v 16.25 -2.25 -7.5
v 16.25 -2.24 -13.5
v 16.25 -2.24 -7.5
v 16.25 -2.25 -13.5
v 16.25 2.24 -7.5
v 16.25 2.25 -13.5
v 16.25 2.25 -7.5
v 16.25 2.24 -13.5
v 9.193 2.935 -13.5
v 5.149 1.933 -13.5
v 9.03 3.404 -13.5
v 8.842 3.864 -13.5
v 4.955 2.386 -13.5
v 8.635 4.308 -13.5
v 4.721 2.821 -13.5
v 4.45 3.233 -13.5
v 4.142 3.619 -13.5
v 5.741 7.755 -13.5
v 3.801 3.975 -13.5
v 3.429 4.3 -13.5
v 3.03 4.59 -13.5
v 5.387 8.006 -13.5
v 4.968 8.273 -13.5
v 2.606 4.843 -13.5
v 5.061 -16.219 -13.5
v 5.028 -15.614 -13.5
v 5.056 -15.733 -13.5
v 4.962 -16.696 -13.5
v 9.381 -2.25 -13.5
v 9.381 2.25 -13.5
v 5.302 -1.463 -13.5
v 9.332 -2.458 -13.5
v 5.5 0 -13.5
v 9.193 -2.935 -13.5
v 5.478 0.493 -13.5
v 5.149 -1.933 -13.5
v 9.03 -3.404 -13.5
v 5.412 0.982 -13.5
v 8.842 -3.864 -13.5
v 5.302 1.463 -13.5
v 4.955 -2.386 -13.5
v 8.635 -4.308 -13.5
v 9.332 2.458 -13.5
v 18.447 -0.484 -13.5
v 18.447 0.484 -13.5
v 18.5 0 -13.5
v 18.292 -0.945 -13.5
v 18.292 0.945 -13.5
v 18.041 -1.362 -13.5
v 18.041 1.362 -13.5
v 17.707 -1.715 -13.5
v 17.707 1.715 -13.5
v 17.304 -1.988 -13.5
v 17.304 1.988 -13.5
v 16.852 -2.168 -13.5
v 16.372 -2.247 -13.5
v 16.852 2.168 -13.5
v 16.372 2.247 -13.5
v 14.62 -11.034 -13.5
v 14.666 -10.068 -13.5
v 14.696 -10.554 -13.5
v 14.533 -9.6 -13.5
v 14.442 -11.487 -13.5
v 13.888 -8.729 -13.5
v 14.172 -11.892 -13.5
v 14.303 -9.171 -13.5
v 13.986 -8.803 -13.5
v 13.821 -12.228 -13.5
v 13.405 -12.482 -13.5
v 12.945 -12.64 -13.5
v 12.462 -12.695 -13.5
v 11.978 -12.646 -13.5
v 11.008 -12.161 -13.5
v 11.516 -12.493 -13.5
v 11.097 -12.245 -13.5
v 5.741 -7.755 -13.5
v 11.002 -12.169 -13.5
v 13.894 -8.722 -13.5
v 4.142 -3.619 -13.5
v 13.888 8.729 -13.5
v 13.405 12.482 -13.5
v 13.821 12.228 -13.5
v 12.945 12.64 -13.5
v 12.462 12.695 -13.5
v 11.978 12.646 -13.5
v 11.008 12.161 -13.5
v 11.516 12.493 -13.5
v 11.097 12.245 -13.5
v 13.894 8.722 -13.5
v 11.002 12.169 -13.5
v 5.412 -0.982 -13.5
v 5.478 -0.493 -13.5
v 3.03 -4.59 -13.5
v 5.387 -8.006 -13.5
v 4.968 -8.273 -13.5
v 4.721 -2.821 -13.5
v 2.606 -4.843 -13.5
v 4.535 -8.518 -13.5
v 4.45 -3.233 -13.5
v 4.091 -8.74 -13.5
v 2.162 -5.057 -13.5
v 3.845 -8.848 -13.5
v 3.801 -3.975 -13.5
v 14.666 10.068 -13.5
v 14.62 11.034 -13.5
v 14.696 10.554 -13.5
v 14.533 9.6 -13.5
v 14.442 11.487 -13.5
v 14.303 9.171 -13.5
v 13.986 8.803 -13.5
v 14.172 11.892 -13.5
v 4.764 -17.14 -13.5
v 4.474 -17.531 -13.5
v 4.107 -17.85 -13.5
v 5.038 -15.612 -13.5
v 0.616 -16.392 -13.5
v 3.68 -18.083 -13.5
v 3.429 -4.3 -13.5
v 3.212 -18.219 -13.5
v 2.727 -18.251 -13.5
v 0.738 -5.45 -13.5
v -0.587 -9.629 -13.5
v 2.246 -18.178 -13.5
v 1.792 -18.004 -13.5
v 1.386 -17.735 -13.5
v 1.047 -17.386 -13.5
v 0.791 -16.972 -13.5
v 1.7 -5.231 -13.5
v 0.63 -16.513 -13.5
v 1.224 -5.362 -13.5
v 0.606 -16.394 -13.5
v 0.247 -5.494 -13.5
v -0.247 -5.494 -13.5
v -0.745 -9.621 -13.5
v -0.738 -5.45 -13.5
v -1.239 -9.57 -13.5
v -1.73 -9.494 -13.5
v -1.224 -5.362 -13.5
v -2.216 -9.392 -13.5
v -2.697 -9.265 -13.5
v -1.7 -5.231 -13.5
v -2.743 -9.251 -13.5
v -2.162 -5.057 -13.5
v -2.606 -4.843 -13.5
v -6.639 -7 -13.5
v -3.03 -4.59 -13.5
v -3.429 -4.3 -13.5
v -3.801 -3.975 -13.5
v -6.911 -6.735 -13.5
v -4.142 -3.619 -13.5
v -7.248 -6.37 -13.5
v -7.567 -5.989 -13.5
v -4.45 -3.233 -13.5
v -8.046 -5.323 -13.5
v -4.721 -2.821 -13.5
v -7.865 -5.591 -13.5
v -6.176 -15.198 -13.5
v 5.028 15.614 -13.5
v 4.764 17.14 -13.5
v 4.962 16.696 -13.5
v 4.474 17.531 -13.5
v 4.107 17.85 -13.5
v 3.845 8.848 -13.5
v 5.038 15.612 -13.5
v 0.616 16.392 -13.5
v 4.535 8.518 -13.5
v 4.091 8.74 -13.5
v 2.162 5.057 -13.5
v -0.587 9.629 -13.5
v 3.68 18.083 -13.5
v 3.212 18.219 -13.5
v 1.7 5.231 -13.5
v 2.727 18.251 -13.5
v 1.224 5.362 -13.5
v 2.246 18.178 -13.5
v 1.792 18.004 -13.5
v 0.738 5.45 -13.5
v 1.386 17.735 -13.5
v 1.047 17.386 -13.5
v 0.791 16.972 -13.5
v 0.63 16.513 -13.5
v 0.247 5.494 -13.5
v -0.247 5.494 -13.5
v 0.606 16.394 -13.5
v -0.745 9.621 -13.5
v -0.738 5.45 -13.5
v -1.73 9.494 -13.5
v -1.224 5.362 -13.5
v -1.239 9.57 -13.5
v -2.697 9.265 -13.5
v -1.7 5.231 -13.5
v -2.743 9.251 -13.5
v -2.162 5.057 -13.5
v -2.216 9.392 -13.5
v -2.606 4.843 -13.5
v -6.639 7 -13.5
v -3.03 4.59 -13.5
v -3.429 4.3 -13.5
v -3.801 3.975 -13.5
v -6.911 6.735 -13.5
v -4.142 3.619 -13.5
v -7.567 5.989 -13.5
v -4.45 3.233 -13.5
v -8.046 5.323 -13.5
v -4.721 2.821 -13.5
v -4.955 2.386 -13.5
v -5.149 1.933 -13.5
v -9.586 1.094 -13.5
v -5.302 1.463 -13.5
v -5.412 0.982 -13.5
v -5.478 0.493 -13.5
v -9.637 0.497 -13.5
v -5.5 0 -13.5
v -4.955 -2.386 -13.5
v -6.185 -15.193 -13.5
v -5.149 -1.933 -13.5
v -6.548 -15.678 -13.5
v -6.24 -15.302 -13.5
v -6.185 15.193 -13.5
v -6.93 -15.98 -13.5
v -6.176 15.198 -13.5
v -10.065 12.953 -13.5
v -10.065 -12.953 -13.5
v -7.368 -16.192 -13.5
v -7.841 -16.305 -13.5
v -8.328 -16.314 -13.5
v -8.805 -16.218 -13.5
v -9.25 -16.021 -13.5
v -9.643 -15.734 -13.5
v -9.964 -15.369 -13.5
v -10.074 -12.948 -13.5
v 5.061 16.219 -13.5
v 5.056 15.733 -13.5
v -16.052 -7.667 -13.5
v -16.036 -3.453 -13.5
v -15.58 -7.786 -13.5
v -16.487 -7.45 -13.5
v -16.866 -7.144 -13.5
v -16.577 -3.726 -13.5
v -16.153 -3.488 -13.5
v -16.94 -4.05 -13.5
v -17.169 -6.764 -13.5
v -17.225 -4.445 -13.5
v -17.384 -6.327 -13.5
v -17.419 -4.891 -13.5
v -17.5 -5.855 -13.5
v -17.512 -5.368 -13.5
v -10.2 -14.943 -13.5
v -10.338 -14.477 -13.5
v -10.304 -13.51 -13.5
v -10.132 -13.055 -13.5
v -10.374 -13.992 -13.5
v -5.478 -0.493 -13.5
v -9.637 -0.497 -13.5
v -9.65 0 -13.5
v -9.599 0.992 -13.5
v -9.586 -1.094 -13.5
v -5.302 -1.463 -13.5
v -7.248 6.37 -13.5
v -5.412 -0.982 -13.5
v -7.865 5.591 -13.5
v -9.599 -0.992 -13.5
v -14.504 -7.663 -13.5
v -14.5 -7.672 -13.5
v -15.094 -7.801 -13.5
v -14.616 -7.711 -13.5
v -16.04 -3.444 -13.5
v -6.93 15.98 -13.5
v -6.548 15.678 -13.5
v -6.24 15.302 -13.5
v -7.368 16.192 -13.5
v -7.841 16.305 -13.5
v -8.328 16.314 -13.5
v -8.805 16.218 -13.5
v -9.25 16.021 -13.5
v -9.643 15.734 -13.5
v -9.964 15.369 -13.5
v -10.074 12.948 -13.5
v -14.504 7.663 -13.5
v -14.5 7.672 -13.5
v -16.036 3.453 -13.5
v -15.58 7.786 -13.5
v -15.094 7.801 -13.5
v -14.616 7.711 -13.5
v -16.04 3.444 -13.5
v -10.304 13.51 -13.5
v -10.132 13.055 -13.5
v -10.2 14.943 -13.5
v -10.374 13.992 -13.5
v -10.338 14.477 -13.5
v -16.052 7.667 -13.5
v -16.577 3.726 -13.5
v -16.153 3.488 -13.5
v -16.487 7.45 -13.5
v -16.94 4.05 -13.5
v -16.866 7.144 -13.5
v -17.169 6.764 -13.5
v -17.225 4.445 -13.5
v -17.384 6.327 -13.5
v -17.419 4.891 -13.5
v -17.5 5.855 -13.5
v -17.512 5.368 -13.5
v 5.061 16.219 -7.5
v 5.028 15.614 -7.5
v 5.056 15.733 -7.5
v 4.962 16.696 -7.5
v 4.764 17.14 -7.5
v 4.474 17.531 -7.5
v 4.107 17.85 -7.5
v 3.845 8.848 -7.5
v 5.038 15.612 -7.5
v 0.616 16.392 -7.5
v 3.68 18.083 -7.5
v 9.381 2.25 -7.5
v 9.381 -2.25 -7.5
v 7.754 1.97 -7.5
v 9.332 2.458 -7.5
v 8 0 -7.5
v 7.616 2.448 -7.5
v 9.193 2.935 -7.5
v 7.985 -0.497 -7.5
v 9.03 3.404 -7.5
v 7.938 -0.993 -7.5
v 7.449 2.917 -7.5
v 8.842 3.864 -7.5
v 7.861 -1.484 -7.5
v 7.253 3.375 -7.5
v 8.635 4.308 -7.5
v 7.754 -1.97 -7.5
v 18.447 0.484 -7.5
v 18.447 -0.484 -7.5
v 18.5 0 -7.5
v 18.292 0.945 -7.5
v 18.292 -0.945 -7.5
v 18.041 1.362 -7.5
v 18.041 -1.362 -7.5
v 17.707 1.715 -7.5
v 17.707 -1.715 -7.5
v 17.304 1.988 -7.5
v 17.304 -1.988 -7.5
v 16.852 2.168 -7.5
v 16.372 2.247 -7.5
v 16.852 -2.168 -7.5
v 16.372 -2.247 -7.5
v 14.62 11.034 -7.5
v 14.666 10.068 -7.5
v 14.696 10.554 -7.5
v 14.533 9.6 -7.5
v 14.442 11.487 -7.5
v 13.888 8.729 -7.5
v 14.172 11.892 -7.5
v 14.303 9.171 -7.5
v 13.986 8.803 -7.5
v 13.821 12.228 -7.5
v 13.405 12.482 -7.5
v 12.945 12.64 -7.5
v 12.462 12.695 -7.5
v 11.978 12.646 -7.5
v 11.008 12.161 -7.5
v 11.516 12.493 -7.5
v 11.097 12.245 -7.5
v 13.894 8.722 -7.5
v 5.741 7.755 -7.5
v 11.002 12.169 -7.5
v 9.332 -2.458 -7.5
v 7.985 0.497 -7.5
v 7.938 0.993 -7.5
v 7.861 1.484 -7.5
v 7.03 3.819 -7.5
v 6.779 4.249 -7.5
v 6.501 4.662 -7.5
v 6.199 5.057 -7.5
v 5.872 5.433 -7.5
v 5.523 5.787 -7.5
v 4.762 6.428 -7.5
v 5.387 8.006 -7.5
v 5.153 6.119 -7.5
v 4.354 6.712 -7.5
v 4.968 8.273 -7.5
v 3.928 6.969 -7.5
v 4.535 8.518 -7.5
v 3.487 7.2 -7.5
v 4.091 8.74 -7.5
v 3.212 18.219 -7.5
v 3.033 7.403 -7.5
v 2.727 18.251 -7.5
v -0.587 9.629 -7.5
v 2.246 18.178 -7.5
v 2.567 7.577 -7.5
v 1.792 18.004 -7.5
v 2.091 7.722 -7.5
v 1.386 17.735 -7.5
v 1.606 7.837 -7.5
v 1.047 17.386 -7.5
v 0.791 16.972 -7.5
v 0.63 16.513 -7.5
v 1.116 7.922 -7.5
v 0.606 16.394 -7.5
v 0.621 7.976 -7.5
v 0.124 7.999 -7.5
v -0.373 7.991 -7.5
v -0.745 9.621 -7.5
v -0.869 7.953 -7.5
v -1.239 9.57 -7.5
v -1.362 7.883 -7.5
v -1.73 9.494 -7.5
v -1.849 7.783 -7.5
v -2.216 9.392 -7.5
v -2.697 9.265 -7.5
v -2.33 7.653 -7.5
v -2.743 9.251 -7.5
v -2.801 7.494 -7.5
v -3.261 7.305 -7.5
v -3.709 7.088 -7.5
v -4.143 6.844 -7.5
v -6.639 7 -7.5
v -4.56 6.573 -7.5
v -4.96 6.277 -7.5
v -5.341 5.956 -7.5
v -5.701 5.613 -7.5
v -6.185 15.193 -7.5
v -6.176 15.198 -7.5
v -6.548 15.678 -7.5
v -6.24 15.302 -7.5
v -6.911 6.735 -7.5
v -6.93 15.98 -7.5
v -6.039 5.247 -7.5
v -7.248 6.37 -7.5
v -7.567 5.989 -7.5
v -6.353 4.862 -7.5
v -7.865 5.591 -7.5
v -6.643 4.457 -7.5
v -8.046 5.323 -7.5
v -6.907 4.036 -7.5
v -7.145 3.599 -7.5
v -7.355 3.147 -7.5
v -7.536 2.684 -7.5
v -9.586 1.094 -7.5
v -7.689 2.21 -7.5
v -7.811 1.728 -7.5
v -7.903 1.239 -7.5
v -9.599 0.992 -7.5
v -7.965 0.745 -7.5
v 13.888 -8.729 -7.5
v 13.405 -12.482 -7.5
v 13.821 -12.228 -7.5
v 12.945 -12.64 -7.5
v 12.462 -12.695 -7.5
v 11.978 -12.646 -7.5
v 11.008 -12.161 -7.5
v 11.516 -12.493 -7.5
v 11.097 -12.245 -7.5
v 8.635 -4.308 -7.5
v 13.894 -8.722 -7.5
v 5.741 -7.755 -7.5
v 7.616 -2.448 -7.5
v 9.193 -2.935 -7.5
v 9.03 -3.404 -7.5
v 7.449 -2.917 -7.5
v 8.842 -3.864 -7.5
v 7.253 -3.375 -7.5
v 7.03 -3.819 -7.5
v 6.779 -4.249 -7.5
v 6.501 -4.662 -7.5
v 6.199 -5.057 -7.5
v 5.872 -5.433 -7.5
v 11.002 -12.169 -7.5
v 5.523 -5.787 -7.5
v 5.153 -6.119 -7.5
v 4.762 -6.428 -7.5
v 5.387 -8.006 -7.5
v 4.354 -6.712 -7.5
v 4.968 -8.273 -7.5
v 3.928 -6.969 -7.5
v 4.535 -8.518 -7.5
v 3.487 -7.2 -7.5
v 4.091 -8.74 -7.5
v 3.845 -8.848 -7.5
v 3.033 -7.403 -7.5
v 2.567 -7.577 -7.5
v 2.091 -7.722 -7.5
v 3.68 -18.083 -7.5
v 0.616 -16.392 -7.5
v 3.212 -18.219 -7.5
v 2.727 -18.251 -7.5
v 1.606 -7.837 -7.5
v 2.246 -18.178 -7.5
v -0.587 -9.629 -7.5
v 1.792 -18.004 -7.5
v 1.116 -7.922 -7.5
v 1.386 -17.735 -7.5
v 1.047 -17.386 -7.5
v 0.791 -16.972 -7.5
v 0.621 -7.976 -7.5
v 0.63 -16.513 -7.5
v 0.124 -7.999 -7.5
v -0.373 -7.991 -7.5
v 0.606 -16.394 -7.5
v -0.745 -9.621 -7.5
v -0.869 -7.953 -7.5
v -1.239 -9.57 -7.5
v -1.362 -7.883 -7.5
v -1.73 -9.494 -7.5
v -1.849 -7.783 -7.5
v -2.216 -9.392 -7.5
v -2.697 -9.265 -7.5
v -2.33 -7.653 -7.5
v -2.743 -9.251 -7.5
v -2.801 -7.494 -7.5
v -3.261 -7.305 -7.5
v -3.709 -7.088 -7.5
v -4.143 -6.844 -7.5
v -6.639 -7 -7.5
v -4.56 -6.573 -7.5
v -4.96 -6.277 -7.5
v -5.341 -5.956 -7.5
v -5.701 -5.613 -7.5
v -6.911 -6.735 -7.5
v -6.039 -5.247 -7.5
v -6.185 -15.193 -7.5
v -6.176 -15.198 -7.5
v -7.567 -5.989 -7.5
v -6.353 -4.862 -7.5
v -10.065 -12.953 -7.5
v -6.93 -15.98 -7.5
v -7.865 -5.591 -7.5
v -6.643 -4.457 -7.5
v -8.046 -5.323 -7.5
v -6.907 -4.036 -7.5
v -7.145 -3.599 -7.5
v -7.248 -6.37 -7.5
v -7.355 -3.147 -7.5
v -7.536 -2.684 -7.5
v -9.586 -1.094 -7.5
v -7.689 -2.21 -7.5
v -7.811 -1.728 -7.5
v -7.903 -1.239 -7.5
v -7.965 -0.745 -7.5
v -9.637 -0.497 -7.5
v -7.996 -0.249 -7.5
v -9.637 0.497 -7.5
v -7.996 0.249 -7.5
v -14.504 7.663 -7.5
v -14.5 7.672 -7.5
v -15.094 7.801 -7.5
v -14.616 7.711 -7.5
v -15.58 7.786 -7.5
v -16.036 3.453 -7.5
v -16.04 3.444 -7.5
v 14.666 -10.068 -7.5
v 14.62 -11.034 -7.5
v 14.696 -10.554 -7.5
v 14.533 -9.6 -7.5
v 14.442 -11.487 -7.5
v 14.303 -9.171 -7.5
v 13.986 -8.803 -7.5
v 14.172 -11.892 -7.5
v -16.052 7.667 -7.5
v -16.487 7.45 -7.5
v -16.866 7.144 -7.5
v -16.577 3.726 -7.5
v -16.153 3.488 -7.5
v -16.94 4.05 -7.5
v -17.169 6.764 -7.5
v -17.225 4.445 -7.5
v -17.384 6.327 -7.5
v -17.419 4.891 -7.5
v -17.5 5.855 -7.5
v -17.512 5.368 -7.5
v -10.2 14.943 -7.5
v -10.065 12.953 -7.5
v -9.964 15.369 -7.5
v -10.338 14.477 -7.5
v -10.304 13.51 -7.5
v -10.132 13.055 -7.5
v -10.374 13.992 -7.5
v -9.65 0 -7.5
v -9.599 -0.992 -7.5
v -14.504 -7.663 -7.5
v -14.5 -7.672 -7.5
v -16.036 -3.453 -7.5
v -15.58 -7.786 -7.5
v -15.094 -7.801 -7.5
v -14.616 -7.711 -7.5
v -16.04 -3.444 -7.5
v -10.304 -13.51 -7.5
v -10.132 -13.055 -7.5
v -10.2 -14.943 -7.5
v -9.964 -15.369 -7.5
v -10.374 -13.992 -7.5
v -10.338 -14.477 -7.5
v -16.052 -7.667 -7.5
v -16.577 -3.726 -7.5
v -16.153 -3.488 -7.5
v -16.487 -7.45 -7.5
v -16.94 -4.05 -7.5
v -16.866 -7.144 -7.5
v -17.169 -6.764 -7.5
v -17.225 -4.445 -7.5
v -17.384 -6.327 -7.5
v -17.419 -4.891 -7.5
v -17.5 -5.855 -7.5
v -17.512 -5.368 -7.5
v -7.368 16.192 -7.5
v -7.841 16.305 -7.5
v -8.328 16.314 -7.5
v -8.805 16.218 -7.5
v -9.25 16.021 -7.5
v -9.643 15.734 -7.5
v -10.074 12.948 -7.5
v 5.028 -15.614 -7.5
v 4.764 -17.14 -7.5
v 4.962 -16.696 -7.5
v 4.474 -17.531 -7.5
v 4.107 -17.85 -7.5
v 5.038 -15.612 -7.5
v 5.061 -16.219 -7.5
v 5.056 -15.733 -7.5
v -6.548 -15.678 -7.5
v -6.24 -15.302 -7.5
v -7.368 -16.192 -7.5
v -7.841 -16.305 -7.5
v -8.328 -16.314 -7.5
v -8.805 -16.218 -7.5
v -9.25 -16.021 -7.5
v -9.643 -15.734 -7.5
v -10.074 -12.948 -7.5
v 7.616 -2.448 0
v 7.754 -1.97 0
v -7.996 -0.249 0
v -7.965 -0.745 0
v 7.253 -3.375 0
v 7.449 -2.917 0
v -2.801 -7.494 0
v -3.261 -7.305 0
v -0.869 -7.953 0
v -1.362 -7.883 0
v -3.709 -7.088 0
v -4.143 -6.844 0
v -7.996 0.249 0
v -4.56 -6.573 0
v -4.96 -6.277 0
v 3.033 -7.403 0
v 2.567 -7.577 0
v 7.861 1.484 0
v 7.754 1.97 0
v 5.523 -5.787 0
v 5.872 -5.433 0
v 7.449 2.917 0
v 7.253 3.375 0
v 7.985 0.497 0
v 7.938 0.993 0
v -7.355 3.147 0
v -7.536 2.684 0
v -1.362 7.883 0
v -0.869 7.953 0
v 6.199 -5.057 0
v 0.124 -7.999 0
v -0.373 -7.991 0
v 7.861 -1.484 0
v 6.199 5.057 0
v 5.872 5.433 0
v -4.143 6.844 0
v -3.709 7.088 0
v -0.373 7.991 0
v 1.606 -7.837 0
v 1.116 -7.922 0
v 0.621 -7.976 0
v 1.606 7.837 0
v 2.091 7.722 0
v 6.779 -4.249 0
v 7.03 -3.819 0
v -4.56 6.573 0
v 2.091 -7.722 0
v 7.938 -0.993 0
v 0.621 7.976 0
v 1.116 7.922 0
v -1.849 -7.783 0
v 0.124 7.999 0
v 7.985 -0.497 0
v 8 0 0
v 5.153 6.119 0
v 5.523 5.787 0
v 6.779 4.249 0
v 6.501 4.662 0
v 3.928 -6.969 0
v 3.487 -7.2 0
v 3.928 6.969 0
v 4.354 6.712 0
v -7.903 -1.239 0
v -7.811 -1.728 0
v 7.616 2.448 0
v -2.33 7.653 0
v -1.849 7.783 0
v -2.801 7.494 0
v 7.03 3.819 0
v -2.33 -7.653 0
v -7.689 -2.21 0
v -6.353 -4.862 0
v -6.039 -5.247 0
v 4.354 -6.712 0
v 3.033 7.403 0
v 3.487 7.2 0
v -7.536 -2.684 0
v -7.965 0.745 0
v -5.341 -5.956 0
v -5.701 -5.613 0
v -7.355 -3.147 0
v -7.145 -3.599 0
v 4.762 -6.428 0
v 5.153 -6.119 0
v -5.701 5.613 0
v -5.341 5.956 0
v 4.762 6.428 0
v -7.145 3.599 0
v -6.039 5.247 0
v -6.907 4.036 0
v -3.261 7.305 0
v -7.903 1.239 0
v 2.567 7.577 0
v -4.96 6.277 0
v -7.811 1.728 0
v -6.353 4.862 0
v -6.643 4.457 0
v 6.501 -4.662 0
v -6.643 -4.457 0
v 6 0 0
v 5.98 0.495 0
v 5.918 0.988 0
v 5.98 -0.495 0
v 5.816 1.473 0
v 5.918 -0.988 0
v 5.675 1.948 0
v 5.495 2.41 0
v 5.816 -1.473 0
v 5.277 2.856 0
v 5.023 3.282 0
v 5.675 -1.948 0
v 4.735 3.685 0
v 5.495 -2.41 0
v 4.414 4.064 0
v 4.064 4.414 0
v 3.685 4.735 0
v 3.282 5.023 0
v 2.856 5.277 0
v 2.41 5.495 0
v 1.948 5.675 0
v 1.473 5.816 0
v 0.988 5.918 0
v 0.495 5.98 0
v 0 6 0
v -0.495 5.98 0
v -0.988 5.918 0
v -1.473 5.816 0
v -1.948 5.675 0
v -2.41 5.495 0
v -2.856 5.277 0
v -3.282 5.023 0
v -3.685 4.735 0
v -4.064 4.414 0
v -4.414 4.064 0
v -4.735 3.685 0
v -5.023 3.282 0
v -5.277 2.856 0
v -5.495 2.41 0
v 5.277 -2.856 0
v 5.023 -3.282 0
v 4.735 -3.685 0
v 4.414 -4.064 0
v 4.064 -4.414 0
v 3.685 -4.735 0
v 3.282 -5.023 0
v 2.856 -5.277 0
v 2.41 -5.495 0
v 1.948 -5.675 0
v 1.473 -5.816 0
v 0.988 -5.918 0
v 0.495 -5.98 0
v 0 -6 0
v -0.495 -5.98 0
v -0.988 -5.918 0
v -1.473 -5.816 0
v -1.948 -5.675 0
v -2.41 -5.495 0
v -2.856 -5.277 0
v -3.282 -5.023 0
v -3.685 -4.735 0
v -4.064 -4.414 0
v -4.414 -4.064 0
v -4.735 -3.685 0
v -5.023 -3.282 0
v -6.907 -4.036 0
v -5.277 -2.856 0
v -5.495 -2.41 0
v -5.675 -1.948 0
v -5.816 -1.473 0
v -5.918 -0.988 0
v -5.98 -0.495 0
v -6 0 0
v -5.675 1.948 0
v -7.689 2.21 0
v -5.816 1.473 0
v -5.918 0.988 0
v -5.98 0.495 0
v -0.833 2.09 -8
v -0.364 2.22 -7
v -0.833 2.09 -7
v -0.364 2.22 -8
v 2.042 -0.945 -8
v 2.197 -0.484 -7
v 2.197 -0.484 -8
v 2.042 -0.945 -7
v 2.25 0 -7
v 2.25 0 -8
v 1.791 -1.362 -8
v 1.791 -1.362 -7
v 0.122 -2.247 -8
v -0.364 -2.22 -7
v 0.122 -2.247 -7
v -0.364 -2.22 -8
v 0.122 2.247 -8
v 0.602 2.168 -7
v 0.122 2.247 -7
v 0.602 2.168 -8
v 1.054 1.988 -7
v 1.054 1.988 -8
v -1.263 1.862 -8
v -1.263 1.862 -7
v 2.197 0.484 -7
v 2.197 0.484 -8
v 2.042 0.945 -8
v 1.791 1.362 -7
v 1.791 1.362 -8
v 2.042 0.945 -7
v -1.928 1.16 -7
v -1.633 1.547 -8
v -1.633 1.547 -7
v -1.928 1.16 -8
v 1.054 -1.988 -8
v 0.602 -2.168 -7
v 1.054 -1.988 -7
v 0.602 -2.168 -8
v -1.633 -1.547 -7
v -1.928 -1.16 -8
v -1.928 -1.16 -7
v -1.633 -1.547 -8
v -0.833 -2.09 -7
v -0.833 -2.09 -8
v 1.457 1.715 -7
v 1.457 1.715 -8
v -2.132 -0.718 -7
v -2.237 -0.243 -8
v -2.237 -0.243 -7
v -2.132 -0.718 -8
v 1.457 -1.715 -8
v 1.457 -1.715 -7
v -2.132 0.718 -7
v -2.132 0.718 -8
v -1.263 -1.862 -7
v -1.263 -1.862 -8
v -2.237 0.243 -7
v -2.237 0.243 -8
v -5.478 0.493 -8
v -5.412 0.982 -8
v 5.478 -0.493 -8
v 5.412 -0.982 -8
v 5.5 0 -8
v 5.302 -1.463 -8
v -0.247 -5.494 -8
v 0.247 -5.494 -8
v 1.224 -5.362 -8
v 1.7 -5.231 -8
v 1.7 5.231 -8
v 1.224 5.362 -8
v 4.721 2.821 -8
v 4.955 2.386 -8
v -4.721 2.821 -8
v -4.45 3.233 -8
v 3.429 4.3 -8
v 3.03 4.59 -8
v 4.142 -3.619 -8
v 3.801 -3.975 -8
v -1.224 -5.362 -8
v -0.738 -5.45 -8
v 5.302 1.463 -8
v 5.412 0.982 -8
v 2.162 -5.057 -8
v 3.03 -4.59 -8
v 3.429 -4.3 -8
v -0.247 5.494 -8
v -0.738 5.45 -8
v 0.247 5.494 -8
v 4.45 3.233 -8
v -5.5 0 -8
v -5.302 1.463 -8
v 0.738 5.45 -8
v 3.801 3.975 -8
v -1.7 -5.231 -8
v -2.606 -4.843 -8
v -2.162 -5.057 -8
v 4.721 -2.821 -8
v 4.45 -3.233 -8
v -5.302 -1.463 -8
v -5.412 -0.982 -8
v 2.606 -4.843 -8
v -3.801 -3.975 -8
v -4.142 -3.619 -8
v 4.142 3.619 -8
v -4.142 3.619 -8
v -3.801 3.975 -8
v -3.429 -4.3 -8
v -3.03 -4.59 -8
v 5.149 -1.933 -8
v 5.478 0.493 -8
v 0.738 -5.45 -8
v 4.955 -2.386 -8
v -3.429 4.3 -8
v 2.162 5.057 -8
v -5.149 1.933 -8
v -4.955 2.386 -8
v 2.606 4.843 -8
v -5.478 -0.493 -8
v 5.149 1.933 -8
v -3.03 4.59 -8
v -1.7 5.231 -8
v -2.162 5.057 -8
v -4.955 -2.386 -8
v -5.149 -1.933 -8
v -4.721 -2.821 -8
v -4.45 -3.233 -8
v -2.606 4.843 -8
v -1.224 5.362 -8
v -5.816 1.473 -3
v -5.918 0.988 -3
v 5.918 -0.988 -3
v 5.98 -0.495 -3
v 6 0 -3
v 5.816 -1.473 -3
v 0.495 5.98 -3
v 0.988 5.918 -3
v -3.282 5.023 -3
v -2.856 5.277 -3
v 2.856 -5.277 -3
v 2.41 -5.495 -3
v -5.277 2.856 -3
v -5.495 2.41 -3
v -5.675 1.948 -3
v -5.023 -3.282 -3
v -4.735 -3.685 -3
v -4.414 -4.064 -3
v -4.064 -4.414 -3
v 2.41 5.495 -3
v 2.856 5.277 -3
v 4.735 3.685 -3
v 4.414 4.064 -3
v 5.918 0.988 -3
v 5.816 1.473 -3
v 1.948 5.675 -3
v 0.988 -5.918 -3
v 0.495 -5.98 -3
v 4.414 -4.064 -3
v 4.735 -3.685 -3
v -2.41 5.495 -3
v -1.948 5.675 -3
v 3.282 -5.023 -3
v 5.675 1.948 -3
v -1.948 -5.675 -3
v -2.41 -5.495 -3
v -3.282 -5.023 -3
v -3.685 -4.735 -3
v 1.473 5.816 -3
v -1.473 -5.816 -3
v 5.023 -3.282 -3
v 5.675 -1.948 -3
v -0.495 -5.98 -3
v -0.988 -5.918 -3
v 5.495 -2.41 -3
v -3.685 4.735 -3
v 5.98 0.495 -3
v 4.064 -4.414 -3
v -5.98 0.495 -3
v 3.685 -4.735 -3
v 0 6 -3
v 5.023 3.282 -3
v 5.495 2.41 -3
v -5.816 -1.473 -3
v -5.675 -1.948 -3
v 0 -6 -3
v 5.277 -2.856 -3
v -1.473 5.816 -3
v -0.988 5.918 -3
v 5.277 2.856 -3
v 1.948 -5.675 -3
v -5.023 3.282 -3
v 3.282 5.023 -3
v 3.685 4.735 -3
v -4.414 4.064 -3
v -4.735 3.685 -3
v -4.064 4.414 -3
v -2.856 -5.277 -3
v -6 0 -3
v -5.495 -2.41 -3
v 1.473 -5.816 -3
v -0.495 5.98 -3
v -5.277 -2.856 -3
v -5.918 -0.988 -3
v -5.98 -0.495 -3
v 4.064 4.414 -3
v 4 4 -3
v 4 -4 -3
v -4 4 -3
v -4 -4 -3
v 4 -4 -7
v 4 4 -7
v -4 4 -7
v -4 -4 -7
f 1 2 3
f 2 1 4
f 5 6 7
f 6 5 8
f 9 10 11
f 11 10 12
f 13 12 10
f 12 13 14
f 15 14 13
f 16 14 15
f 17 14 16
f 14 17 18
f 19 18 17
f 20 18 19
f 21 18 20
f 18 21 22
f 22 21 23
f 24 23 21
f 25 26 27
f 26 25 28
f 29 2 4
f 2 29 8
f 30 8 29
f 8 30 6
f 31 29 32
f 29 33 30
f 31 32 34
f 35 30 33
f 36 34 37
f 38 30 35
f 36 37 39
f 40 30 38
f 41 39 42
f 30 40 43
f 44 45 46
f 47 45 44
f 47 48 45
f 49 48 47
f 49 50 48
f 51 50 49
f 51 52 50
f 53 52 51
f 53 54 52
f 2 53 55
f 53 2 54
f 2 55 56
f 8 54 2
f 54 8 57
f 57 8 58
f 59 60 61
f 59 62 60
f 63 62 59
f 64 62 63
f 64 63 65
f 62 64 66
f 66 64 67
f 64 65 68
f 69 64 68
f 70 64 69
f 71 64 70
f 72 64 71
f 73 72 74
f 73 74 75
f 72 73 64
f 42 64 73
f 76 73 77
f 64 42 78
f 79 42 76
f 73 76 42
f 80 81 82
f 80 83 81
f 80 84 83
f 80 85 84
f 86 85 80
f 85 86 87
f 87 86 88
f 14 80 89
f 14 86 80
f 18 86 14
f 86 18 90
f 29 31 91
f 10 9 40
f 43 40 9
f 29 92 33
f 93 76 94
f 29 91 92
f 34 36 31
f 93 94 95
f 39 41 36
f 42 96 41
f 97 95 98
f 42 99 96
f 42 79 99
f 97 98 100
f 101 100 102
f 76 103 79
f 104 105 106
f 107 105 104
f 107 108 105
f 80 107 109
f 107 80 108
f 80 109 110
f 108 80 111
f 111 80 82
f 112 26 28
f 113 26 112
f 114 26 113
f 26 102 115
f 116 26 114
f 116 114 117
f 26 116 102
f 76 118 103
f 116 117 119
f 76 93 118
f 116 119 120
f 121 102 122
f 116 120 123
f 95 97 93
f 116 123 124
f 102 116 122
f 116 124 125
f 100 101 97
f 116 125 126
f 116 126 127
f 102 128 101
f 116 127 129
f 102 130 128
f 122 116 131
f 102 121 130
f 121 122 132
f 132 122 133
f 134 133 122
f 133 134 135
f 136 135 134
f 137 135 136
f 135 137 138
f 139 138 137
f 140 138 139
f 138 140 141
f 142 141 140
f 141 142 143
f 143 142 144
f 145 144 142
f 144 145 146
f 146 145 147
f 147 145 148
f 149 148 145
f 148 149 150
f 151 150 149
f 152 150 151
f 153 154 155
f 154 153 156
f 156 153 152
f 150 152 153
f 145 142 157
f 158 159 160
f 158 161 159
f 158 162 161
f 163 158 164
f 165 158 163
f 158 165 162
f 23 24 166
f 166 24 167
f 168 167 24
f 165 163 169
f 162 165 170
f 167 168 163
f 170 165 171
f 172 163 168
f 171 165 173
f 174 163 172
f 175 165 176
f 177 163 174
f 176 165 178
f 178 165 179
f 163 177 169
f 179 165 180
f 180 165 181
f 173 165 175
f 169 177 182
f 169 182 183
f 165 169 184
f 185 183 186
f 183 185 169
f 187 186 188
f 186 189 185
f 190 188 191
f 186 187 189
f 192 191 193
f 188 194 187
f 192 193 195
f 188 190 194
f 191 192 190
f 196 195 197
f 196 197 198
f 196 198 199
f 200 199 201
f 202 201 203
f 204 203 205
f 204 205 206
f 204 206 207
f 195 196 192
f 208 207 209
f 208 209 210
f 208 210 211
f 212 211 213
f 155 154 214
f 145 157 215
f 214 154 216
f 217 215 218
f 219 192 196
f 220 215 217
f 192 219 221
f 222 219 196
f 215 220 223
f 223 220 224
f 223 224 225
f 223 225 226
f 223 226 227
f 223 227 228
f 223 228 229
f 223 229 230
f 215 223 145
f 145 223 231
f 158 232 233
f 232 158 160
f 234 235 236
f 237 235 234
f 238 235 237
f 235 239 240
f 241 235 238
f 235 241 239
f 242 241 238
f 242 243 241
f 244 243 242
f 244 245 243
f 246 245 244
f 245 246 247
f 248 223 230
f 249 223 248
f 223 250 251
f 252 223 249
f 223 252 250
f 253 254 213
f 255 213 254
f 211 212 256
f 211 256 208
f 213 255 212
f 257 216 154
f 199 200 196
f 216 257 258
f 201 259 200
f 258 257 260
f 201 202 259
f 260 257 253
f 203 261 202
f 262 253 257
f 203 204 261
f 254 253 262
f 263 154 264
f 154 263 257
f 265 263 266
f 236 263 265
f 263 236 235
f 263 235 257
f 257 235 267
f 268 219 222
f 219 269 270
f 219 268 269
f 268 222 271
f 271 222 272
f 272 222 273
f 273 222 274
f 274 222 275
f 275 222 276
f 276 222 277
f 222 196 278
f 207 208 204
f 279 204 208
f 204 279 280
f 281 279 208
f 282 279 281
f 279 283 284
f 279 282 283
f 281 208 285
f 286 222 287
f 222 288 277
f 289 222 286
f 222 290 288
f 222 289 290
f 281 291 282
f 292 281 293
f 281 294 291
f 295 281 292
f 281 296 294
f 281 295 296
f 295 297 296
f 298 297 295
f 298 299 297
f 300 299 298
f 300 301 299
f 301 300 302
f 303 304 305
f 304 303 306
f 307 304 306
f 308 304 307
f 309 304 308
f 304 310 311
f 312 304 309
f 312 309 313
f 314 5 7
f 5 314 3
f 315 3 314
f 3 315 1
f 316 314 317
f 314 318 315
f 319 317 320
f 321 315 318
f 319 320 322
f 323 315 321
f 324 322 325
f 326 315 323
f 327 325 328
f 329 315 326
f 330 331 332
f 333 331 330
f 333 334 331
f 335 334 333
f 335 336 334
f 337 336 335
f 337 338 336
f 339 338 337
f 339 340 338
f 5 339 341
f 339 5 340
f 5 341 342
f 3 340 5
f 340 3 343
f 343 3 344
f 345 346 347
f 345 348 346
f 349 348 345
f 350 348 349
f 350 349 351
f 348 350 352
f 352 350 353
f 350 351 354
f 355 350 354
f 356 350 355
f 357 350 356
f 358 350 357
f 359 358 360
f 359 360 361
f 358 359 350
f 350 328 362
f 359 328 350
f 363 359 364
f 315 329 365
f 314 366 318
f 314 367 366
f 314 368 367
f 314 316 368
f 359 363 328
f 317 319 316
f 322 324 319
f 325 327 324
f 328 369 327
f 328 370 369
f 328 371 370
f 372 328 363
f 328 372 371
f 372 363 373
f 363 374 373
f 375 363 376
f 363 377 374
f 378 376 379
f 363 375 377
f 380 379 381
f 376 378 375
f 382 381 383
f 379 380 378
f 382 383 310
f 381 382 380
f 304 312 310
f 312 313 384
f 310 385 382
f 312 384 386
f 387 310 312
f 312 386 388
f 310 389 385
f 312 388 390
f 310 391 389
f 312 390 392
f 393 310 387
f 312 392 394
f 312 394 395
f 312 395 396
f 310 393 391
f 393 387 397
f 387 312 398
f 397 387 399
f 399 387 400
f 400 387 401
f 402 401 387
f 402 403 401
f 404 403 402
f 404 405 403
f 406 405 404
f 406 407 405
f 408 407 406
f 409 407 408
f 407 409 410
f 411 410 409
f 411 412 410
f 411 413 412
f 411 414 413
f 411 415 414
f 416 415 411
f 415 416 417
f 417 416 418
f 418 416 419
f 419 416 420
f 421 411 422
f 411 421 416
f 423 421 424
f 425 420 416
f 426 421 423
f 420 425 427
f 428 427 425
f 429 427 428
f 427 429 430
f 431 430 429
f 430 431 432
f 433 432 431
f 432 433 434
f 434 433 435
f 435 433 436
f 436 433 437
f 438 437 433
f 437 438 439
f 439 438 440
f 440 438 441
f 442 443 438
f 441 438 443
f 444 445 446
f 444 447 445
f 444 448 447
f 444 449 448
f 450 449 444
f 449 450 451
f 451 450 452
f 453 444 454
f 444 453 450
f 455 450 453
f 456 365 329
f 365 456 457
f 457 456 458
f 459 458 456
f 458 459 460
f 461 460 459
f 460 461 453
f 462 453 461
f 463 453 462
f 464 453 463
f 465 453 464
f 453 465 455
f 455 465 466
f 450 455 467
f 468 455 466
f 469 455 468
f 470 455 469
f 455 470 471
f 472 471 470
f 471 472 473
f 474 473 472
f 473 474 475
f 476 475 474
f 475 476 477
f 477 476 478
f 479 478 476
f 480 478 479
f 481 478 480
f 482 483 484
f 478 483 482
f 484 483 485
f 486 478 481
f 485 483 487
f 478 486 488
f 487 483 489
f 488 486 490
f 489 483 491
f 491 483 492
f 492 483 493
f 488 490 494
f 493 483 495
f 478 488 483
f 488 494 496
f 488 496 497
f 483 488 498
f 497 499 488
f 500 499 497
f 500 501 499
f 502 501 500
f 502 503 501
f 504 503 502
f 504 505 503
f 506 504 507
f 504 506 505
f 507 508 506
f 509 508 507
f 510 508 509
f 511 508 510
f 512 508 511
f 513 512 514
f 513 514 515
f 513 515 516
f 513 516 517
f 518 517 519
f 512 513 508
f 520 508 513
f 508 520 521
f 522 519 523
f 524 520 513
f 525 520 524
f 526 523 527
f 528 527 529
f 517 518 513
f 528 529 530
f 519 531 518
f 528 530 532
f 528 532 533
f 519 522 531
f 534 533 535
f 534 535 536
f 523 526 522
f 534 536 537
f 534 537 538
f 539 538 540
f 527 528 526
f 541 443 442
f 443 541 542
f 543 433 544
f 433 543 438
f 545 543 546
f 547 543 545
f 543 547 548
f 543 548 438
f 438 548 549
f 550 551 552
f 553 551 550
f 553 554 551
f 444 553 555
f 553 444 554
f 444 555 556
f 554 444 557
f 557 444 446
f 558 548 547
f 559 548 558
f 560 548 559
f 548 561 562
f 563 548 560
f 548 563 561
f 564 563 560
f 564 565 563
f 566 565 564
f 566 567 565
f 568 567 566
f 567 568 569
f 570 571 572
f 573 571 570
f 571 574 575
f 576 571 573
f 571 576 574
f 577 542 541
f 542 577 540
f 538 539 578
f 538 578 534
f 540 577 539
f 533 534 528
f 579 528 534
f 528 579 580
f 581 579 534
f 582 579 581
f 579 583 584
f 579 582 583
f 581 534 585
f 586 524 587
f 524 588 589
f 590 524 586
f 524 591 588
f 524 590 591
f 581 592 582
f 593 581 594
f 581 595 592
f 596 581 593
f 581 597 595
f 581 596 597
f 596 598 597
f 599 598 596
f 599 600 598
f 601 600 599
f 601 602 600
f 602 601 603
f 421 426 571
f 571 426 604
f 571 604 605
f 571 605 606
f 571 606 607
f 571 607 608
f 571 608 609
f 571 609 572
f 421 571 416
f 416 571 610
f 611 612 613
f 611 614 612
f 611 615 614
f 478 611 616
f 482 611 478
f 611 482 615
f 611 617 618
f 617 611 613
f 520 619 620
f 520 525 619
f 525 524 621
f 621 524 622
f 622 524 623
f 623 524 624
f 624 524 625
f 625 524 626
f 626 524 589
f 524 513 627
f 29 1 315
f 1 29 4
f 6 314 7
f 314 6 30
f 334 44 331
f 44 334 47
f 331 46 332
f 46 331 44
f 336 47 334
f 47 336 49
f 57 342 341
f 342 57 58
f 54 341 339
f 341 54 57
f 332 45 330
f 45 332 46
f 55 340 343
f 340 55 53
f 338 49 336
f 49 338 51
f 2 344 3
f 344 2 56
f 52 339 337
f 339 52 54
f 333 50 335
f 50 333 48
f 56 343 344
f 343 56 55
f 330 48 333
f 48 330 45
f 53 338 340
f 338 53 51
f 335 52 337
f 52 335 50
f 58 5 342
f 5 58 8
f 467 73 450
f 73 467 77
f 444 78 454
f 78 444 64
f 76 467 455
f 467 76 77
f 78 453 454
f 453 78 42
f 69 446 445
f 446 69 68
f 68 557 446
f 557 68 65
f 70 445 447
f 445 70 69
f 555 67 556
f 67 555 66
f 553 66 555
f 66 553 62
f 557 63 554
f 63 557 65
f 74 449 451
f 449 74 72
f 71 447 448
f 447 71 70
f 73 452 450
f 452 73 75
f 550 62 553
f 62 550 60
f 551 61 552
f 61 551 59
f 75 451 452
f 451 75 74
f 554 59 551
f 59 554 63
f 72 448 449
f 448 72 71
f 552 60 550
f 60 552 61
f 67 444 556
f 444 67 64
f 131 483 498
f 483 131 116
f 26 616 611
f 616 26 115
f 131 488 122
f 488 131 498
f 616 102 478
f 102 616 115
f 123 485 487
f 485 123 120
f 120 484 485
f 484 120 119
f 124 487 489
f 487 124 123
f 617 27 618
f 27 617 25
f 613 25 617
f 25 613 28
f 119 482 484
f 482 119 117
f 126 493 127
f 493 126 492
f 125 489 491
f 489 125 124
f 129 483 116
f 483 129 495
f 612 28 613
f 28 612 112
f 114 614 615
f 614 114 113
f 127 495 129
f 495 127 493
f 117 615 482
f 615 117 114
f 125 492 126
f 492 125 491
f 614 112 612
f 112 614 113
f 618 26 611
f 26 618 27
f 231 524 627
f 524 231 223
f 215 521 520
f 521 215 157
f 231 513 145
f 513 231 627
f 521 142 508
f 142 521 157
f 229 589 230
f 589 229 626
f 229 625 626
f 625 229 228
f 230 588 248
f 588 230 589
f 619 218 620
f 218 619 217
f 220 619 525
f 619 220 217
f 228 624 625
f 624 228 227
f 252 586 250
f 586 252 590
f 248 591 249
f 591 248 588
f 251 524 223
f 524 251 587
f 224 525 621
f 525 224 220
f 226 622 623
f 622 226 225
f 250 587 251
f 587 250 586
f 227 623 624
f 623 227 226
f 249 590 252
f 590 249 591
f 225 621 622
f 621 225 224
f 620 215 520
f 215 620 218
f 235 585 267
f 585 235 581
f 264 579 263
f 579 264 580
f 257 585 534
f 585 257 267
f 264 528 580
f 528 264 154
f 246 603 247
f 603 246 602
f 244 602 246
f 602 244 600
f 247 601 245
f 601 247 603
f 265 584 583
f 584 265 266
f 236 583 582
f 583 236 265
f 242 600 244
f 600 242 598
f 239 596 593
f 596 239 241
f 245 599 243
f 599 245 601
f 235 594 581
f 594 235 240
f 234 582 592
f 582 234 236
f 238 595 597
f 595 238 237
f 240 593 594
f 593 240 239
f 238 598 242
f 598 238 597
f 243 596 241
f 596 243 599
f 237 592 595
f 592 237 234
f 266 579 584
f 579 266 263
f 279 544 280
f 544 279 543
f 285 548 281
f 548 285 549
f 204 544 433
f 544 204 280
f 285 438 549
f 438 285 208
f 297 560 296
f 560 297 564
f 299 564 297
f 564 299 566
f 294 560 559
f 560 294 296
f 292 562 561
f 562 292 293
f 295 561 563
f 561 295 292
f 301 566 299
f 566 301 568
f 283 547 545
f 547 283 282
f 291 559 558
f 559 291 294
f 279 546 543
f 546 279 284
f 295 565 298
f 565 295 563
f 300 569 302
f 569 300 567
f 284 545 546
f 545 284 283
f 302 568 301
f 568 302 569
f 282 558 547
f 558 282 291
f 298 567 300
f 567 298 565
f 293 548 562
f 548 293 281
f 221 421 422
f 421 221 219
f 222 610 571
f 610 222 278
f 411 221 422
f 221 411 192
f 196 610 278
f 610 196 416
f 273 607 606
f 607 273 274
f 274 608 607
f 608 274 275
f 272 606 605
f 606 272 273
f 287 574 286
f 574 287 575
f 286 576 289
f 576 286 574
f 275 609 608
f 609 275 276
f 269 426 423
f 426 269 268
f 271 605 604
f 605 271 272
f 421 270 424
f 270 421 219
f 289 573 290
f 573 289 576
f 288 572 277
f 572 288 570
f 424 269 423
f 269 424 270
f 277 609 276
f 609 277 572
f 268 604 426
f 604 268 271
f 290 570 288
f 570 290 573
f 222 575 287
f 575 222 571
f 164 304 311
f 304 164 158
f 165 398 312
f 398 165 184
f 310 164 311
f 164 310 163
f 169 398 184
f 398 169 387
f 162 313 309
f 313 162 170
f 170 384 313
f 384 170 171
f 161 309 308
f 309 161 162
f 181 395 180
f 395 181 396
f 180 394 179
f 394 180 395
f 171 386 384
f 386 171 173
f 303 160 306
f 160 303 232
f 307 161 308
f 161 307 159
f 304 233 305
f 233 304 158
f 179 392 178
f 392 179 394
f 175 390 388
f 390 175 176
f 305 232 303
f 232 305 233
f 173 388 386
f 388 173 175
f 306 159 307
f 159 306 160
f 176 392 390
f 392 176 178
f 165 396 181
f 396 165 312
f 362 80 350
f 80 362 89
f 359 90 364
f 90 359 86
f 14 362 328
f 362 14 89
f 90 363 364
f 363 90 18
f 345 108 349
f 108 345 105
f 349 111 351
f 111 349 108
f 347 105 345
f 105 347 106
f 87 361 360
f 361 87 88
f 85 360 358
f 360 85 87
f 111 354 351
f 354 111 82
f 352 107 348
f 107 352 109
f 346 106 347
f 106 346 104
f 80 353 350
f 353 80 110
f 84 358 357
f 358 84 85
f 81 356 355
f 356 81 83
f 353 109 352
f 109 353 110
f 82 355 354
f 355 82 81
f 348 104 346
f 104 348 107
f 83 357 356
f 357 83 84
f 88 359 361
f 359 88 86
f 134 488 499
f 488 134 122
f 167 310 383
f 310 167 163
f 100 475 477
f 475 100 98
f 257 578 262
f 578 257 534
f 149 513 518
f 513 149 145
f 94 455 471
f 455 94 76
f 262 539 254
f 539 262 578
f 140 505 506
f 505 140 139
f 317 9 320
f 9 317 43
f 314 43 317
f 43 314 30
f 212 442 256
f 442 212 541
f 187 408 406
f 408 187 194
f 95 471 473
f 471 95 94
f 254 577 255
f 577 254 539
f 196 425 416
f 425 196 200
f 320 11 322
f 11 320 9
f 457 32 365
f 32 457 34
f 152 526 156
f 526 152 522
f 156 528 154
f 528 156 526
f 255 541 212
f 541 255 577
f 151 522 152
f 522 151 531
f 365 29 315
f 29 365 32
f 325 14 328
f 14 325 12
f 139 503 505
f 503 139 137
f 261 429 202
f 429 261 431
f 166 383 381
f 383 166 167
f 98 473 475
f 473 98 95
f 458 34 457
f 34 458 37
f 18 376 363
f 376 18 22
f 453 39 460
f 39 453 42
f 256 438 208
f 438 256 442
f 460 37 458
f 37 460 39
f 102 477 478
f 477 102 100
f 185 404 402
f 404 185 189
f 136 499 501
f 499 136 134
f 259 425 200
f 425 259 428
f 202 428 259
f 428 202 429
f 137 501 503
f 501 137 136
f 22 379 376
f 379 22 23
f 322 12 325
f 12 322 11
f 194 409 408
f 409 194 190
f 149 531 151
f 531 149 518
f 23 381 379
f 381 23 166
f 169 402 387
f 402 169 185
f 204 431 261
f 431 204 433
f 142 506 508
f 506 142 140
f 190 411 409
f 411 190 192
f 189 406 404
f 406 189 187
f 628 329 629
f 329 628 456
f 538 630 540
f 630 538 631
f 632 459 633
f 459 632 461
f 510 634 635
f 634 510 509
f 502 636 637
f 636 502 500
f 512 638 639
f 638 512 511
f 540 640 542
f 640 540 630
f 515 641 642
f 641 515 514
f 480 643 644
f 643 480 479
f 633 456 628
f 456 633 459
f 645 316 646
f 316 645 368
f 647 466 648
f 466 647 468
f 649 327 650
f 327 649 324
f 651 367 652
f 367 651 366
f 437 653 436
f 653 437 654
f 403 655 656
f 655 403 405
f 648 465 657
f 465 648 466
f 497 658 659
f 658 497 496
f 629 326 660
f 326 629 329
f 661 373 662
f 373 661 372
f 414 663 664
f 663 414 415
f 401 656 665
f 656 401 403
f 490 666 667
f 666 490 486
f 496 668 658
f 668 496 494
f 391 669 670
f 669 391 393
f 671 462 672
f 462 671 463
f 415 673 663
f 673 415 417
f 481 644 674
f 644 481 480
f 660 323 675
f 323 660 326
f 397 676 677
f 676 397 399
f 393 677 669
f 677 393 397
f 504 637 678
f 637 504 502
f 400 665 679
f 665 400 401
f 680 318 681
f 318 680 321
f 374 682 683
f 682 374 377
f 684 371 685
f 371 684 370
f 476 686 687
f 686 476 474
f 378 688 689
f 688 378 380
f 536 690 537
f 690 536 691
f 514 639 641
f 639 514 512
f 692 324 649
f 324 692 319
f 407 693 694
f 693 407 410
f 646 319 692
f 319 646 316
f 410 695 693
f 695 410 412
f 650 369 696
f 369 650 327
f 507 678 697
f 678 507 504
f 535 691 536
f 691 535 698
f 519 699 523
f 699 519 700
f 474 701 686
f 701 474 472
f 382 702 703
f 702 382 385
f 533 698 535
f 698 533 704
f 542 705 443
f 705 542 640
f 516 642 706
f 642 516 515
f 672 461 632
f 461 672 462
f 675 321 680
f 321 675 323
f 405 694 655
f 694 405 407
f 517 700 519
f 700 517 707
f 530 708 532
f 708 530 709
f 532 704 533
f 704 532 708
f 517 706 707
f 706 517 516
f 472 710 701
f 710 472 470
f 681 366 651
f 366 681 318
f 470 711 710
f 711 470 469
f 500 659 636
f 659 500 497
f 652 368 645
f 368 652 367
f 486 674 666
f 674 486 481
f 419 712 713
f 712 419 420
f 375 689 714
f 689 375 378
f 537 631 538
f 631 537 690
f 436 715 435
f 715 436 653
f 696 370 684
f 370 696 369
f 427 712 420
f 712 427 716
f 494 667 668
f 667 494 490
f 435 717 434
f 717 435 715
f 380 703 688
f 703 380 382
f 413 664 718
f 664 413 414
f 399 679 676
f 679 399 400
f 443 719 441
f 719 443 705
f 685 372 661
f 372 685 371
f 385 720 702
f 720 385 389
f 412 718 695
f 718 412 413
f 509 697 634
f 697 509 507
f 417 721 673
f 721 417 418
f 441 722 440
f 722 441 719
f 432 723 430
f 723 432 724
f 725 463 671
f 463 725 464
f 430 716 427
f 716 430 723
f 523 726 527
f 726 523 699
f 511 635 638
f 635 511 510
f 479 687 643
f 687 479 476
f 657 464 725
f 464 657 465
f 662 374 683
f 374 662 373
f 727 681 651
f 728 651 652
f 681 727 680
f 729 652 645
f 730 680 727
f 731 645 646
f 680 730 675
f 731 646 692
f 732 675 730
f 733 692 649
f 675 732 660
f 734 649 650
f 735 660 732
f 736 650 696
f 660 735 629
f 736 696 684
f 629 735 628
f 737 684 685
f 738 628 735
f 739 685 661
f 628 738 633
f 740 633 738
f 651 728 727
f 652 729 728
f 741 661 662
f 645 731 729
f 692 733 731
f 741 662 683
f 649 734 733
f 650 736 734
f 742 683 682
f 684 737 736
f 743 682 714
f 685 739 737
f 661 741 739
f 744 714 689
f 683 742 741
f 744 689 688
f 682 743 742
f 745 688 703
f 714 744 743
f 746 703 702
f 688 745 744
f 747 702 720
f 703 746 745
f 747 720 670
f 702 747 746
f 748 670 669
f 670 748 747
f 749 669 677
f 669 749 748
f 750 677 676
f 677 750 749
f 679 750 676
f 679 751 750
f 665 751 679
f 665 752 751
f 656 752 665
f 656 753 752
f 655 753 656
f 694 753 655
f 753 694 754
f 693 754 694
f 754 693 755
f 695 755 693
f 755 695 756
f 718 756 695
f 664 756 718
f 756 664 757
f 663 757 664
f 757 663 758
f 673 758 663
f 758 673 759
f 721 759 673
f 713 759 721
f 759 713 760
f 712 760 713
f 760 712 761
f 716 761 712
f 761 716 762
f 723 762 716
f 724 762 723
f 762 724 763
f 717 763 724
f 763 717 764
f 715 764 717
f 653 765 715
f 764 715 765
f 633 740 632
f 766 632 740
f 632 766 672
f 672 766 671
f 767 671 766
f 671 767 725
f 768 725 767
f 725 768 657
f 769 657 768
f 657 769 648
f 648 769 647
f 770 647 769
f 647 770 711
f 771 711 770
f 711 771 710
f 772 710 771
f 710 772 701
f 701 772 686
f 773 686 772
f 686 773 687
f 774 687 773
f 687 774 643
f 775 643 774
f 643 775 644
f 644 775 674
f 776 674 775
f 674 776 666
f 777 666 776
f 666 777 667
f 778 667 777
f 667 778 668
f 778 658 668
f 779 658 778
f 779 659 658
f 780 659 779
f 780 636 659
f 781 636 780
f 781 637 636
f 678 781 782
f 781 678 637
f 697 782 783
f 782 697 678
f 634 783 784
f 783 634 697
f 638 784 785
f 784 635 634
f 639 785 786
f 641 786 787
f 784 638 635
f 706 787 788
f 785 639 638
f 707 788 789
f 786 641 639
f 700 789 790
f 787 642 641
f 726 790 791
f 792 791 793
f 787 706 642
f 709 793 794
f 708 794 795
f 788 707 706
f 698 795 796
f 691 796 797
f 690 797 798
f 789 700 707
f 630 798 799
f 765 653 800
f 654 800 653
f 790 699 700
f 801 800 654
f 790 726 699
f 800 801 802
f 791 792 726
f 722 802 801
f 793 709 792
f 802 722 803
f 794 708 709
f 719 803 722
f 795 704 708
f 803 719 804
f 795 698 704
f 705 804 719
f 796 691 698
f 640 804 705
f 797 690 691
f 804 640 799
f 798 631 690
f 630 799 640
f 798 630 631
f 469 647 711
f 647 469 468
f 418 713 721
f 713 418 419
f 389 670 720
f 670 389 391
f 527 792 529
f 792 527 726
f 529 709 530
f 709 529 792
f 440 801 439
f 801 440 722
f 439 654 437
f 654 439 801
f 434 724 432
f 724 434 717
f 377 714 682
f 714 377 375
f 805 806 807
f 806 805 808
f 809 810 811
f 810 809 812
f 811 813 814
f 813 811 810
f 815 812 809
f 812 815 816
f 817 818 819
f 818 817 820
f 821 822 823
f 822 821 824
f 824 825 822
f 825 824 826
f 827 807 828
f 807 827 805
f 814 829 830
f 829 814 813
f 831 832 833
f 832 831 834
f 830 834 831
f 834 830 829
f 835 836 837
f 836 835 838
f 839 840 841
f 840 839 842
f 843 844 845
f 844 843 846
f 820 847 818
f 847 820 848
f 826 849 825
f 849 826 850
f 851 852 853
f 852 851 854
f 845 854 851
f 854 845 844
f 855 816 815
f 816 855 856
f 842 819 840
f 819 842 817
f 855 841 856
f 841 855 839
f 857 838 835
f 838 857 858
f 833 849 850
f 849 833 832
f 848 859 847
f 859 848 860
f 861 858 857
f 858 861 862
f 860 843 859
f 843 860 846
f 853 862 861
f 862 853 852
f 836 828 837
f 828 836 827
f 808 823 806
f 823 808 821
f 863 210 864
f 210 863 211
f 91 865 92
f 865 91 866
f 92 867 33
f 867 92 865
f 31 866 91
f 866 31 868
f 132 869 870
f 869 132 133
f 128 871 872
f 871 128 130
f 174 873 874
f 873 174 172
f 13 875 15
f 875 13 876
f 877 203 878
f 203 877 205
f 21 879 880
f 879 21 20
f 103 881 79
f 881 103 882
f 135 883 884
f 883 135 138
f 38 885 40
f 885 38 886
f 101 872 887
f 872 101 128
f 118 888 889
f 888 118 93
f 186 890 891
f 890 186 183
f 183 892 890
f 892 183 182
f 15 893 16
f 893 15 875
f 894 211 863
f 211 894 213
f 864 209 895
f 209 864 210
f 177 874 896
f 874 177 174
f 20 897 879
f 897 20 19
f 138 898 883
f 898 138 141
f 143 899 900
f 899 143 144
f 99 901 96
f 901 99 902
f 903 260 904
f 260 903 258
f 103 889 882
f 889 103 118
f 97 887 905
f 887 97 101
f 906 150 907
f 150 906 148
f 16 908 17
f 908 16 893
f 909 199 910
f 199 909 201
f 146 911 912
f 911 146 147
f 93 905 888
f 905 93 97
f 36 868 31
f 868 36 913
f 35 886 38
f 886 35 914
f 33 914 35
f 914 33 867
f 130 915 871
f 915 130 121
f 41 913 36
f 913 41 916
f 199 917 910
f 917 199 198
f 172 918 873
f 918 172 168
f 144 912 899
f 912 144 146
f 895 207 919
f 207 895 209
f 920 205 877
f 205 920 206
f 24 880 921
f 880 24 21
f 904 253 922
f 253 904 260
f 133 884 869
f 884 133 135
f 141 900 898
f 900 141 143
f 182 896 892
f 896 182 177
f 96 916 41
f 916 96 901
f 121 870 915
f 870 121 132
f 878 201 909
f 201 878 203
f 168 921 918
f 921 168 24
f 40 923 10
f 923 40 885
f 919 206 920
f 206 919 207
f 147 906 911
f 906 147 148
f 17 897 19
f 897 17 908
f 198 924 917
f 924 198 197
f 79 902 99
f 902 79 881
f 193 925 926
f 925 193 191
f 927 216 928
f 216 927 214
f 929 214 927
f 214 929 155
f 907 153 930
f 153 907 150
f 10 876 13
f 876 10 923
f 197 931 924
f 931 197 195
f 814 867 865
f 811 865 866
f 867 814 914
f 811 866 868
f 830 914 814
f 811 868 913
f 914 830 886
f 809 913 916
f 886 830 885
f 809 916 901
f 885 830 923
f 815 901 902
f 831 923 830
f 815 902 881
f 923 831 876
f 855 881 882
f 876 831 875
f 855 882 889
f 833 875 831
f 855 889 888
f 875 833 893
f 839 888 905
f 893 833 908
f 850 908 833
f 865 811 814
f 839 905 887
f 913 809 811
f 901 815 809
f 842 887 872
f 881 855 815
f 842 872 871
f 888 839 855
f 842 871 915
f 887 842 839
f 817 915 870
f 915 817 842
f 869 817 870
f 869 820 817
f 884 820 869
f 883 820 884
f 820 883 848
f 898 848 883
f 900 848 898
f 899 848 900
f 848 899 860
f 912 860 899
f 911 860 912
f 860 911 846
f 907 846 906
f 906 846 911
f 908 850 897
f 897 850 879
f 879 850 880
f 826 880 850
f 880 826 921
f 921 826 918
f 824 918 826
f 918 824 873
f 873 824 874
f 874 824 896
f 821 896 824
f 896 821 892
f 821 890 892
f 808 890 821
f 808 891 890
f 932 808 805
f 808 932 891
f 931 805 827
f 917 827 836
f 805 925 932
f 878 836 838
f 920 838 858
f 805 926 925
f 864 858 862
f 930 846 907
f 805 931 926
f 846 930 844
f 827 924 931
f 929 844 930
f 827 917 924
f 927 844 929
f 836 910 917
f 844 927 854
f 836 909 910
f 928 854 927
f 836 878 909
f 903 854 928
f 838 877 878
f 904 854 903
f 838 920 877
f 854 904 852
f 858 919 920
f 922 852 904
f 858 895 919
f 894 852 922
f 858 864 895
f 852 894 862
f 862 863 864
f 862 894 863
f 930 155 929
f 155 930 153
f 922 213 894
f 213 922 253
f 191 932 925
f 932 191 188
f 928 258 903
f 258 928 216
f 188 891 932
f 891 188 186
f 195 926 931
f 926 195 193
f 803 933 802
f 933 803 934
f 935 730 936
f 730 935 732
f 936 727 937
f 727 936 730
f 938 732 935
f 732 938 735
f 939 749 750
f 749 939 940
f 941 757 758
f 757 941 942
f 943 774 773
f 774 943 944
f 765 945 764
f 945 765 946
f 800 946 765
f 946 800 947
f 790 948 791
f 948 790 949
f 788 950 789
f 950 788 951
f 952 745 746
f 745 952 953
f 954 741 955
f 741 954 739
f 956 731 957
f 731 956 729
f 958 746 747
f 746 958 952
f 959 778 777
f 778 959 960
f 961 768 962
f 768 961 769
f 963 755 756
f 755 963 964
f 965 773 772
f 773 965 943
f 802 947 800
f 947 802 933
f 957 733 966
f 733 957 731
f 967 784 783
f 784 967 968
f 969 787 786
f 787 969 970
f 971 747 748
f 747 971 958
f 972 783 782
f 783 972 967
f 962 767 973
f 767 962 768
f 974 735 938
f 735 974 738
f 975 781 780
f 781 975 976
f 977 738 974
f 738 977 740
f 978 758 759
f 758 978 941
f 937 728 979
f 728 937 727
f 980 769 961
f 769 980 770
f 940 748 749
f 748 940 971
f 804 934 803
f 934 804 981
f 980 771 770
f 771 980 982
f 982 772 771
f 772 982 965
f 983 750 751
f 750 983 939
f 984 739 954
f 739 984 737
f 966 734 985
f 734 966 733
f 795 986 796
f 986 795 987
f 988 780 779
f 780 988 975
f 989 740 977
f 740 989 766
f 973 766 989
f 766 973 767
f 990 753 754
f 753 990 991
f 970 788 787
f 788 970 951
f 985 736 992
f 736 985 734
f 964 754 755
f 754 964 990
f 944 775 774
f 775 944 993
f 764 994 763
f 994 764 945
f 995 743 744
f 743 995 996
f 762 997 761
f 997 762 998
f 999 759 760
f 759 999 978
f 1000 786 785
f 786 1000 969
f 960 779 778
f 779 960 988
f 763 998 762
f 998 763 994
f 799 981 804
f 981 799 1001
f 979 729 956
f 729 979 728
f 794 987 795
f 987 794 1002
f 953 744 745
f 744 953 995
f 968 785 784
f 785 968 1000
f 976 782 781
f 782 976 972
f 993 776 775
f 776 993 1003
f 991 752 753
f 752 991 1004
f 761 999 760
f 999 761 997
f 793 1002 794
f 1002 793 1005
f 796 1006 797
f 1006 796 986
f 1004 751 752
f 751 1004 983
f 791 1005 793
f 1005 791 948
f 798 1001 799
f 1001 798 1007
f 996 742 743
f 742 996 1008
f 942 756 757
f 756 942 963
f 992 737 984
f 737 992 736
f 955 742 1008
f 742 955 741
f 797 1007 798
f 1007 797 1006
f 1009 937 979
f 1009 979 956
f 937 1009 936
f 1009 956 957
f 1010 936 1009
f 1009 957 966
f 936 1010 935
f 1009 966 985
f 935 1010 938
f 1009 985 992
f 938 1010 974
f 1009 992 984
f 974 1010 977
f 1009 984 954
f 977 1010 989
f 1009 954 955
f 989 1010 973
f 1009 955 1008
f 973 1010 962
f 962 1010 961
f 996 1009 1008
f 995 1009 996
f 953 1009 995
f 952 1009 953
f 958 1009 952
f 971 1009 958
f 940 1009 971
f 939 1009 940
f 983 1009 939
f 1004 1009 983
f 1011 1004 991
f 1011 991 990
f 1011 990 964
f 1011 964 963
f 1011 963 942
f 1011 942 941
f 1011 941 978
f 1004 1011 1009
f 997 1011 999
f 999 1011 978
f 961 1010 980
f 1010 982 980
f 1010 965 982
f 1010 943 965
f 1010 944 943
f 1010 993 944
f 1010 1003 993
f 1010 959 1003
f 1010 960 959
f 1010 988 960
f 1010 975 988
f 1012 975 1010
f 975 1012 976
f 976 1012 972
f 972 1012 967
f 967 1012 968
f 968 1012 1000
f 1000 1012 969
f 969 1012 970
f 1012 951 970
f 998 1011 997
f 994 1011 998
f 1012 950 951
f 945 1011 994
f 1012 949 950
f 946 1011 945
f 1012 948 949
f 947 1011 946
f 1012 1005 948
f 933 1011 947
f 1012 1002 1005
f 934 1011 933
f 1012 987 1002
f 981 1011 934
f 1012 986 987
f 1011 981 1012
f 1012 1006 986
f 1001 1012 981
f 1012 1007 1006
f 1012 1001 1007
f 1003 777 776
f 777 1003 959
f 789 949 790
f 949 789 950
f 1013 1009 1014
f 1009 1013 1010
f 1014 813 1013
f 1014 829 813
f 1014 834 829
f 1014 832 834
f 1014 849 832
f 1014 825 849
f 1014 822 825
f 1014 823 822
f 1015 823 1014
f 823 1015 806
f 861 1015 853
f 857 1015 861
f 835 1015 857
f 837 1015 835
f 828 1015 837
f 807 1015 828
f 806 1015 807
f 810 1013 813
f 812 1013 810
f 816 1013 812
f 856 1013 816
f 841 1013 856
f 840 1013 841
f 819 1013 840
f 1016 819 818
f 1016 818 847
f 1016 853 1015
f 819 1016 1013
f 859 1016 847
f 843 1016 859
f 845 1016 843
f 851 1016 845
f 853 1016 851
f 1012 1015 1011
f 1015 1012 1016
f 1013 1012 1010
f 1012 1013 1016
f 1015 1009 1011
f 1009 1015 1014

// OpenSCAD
// Thickness of the gear teeth. Factory default is 4.5.
tooth_thickness = 6;

// Length of the shaft, not including the part that runs through the teeth. Default 5.
shaft_height = 7.5;

// Outer diameter of the shaft.
shaft_diameter = 16;

// Inner diameter of the shaft (or diameter of the screw).
screw_diameter = 4.5;

// The length of the screw (ignoring the head) that can be inside the gear.
screw_length = 8; 

// Diameter of the countersink for the screw head.
screw_countersink_diameter = 11;

tooth_count = 9;
tooth_width = 4.5;
tooth_length = 9.4;
teeth_diameter = 37;
screw_countersink_depth = tooth_thickness + shaft_height - screw_length;

round_inner_tooth_part_diameter = 19.3;

knob_round_diameter = 12;
knob_round_penetration = 3;

knob_square_width = 8;
knob_square_penetration = 4;

$fs = .5;
$fa = .5;

rotate([180,0,0]) difference() {
    union() {
        // The gear shaft.
        cylinder( d=shaft_diameter, h=tooth_thickness + shaft_height );
        
        
        translate( [0, 0, shaft_height] ) {
            cylinder( d = round_inner_tooth_part_diameter, h=tooth_thickness );
        
            for ( i = [0:9]) {
                rotate([0, 0, 360 / tooth_count * i]) translate([0, -tooth_width / 2, 0]) {
                    cube([teeth_diameter / 2 - ( tooth_width / 2 ), tooth_width, tooth_thickness]);
                    translate([teeth_diameter / 2 - tooth_width / 2,tooth_width / 2,0]) cylinder( d=tooth_width, h=tooth_thickness);
                }
            }
        }
    }
    
    // The hole for the screw.
    cylinder( d=screw_diameter, h=tooth_thickness + shaft_height );
    
    // The countersink for the screw head.
    translate([0, 0, screw_length]) cylinder( d=screw_countersink_diameter, h=screw_countersink_depth );
    
    // The inset for the round part of the knob.
    cylinder( d = knob_round_diameter, h = knob_round_penetration );
    
    translate([0,0,(knob_round_penetration + knob_square_penetration)/2]) cube([knob_square_width, knob_square_width, knob_round_penetration + knob_square_penetration ], true);
}
    
